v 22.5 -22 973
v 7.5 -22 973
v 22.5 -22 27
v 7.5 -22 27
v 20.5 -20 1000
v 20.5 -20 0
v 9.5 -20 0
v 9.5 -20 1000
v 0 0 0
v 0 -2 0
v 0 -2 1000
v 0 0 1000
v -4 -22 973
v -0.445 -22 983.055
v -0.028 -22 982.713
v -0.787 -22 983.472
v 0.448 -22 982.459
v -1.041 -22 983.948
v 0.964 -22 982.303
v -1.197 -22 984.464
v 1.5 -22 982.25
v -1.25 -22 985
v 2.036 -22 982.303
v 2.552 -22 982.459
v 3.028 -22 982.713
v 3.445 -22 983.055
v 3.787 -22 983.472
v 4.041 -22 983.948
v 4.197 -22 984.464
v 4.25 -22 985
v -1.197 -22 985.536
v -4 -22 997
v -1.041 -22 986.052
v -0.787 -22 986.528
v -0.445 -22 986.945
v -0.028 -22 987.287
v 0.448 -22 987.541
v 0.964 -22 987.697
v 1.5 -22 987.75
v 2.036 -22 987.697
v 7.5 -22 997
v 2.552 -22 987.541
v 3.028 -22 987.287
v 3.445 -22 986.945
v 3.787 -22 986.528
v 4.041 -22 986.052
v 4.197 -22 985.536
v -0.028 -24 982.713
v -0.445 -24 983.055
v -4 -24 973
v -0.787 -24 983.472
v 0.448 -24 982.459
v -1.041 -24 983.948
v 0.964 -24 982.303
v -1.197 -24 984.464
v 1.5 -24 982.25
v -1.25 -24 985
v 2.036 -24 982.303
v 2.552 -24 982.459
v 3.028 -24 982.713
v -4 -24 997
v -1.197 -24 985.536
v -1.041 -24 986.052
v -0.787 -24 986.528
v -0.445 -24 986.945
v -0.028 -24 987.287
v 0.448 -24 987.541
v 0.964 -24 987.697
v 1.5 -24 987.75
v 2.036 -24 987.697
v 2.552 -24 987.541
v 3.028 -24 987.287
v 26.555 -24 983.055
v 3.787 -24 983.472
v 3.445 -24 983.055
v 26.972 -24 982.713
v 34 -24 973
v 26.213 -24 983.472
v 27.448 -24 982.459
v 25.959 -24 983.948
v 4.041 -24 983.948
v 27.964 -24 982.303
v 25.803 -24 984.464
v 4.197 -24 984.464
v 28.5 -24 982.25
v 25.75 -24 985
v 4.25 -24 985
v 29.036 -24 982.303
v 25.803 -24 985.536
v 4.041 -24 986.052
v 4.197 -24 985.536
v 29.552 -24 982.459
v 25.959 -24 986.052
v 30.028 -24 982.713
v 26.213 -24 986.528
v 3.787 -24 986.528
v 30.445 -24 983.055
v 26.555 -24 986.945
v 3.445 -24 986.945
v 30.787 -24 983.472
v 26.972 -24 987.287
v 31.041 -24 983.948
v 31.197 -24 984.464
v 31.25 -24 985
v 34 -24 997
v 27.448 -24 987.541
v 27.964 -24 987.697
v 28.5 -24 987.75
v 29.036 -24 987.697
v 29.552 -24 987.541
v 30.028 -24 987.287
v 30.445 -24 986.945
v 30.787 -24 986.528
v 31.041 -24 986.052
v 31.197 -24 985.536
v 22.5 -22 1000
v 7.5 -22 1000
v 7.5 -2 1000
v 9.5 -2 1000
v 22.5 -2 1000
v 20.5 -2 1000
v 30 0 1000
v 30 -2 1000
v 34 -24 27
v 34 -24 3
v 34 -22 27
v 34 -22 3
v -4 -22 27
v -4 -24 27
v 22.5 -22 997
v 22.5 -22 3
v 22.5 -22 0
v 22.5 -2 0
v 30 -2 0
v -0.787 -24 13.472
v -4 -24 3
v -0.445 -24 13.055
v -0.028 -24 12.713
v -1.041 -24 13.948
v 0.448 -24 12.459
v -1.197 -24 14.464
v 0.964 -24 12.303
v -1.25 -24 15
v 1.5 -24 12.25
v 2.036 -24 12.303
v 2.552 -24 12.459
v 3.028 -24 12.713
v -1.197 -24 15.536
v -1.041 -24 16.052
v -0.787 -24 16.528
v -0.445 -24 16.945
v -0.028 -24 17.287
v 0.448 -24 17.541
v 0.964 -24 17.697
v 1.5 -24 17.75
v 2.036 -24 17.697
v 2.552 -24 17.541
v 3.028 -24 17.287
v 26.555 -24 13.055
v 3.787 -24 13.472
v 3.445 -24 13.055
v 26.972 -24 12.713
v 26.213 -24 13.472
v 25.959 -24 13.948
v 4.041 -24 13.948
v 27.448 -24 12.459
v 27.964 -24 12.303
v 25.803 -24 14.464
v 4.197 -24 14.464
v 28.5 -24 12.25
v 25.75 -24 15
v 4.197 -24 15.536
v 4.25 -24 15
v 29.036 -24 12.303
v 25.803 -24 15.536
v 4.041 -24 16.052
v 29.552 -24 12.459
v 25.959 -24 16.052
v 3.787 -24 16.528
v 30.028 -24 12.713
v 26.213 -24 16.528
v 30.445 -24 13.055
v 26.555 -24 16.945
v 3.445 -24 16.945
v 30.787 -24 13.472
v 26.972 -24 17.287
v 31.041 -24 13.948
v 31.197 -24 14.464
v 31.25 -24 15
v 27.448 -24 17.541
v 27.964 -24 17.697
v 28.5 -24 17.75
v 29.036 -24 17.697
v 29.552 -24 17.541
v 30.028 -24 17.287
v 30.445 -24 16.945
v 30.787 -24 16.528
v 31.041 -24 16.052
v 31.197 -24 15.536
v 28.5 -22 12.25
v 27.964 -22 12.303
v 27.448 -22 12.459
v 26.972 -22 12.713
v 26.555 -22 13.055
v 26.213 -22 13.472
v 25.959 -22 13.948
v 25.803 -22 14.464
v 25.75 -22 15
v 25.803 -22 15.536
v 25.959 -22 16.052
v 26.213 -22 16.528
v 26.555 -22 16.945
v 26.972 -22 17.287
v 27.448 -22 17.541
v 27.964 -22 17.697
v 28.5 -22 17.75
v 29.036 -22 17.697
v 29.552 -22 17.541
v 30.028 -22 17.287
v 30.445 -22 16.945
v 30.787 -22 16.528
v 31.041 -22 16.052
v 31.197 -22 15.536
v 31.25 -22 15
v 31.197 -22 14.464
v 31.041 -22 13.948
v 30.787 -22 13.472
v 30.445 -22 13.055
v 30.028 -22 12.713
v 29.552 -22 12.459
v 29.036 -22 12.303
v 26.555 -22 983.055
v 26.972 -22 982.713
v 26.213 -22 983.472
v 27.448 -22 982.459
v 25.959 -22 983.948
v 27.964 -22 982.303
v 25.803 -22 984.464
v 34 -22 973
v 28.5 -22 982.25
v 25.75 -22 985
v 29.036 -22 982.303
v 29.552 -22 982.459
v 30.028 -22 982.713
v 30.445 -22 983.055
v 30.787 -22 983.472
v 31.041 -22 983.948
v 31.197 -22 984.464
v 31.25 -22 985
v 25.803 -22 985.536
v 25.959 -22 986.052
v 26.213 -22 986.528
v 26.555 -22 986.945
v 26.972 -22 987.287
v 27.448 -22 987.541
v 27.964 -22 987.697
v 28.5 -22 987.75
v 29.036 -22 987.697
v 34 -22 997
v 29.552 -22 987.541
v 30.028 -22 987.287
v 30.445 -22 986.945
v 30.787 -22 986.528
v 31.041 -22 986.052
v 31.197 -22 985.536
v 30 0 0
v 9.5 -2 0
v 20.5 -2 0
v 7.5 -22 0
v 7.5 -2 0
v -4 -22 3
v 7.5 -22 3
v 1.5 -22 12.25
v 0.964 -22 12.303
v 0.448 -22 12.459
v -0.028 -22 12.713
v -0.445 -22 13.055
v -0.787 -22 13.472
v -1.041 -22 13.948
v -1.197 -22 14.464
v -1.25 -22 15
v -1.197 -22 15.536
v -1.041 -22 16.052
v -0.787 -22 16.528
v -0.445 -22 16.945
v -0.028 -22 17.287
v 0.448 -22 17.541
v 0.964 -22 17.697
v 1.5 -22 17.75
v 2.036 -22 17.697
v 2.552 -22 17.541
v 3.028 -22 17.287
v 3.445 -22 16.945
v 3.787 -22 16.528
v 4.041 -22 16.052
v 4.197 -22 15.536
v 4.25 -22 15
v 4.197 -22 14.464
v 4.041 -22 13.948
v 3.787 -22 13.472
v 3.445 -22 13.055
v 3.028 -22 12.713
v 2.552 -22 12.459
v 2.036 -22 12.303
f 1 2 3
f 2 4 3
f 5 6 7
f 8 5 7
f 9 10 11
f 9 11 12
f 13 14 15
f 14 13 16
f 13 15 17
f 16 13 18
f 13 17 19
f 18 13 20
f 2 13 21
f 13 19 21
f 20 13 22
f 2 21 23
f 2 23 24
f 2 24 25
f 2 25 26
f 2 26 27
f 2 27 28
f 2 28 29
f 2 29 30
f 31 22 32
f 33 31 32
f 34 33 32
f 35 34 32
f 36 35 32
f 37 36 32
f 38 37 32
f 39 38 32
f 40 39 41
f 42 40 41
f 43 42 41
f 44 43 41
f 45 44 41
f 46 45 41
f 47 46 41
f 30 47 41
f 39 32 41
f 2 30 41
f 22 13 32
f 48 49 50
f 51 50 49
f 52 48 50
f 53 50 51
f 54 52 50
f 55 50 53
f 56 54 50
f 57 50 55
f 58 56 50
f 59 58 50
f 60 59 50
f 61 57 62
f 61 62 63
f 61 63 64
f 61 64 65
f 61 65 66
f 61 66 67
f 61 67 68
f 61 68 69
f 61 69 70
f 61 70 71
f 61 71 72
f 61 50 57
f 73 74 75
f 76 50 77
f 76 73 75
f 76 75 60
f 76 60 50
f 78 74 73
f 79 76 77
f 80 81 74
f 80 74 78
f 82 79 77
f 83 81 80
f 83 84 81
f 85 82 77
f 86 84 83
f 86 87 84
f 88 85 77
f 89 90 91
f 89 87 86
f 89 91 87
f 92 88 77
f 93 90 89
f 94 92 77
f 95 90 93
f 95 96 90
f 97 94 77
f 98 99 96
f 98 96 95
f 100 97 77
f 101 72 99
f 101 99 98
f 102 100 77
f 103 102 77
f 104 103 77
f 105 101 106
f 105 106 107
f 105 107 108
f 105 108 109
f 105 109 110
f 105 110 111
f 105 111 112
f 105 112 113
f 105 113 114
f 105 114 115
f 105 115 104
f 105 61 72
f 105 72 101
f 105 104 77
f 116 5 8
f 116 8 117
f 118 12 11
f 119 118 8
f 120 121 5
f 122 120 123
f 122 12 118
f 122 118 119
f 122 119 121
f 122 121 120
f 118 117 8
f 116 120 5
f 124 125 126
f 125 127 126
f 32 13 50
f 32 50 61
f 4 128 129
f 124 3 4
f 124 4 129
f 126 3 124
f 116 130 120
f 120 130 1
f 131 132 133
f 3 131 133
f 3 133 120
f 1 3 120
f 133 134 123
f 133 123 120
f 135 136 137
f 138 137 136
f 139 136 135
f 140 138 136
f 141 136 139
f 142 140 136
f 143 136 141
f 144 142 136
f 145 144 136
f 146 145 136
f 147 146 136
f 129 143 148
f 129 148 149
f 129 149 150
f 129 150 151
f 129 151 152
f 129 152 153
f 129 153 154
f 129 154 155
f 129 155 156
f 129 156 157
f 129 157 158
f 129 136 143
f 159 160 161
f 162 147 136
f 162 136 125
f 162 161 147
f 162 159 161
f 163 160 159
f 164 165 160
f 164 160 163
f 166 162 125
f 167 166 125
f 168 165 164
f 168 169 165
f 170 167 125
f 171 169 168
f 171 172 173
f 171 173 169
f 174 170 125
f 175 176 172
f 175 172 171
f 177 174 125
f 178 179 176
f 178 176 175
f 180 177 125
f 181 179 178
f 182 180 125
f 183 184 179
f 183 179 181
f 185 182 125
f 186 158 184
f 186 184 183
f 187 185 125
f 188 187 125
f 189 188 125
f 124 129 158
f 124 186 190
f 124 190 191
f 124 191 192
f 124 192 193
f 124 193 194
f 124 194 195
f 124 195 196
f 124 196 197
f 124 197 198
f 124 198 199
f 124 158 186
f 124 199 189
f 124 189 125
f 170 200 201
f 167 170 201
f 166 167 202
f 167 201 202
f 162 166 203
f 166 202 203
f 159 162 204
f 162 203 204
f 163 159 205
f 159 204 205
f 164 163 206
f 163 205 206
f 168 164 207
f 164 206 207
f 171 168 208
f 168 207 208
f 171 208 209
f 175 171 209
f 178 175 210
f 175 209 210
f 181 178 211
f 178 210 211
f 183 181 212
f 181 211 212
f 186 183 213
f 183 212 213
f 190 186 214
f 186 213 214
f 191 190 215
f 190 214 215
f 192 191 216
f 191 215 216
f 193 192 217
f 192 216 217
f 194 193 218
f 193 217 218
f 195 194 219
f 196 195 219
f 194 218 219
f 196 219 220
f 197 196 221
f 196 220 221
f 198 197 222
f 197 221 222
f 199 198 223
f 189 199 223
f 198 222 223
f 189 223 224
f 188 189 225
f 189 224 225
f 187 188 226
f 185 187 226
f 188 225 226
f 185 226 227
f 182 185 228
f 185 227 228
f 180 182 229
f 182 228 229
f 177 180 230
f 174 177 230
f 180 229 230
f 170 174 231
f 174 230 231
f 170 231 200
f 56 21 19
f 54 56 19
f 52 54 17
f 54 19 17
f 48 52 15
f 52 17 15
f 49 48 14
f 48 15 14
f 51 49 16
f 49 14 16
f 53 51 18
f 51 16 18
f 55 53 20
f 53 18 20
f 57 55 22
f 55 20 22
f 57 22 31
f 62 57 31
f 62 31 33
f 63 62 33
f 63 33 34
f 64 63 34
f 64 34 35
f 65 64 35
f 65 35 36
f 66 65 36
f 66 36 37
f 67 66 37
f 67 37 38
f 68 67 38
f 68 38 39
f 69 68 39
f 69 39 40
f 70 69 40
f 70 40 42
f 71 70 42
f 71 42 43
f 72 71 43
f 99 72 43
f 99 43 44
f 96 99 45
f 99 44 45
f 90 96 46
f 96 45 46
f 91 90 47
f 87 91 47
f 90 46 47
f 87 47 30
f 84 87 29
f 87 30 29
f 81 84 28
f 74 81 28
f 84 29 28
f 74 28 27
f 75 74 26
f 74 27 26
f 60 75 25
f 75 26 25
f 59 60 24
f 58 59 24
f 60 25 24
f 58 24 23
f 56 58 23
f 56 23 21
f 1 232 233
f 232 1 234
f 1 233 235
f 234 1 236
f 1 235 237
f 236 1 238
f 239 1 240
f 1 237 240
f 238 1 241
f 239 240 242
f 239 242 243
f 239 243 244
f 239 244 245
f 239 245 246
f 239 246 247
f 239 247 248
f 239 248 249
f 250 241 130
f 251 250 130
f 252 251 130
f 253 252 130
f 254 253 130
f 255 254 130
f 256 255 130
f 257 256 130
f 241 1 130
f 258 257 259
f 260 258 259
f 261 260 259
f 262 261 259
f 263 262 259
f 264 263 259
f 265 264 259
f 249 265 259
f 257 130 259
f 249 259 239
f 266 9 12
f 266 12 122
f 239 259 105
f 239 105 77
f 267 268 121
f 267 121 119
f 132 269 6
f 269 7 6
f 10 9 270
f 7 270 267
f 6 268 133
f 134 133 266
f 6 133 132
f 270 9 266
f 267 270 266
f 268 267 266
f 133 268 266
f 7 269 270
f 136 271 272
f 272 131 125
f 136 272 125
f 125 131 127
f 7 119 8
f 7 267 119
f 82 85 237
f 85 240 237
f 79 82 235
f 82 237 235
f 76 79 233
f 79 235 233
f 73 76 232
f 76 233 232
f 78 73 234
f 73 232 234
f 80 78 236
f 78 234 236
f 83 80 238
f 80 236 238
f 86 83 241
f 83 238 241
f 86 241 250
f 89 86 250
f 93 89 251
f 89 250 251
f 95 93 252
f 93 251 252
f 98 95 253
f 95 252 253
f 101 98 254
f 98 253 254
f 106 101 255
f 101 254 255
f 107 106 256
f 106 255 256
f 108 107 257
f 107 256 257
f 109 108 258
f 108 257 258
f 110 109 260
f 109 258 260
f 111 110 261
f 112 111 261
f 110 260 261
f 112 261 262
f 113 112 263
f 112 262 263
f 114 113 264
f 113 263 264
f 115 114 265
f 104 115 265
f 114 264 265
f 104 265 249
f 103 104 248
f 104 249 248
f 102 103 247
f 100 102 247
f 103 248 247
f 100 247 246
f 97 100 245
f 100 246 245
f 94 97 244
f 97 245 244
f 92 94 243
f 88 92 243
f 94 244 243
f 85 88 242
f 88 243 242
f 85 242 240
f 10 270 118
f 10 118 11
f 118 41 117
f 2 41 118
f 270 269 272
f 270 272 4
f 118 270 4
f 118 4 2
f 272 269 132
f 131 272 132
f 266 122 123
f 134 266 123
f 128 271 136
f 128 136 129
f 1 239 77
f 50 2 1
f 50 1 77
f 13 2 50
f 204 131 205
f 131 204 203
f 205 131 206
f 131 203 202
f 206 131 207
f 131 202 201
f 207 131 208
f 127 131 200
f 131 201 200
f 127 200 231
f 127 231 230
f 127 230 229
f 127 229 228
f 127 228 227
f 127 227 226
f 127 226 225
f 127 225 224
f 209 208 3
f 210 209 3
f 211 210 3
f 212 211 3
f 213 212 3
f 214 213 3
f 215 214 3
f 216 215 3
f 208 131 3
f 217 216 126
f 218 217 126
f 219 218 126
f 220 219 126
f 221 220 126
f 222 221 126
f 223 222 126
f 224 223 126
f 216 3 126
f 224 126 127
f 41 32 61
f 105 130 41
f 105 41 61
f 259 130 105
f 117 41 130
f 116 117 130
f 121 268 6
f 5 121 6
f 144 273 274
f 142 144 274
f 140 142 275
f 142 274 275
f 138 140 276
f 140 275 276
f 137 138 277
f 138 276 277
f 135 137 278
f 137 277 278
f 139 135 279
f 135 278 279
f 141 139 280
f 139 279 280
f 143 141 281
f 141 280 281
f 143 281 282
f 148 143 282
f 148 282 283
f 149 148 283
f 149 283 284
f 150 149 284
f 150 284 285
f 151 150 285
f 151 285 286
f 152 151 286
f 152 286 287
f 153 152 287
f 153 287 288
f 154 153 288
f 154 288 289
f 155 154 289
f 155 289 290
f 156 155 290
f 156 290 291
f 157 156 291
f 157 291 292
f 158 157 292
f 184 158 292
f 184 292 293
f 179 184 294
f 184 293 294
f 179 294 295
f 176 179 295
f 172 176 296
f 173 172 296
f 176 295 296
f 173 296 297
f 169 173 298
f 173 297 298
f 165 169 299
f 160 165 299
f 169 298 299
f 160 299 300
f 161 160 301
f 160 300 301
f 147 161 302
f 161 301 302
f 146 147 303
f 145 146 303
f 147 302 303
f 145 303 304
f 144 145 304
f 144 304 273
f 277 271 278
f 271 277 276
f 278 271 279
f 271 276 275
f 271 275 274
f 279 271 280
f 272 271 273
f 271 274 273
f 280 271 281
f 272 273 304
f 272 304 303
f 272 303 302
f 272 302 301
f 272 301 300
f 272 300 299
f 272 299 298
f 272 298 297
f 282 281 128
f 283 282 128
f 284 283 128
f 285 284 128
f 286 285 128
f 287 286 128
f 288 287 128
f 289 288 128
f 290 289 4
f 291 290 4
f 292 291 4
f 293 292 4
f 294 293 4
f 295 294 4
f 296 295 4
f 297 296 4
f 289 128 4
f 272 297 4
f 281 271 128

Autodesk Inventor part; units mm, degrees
ref_plane "YZ Plane" through (0, 0, 0) normal (1, 0, 0) x (0, 1, 0)
ref_plane "XZ Plane" through (0, 0, 0) normal (0, 1, 0) x (-1, 0, 0)
ref_plane "XY Plane" through (0, 0, 0) normal (0, 0, 1) x (1, 0, 0)
sketch "Skizze1" plane through (0, 0, 0) normal (0, 0, 1) x (1, 0, 0)
  line L0 (0, 0) -> (30, 0)
  line L1 (30, 0) -> (30, -2)
  line L2 (30, -2) -> (0, -2)
  line L3 (0, -2) -> (0, 0)
  line L4 (7.5, -2) -> (9.5, -2)
  line L5 (9.5, -2) -> (9.5, -22)
  line L6 (9.5, -22) -> (7.5, -22)
  line L7 (7.5, -22) -> (7.5, -2)
  line L8 (9.5, -22) -> (20.5, -22)
  line L9 (20.5, -22) -> (20.5, -20)
  line L10 (20.5, -20) -> (9.5, -20)
  line L11 (9.5, -20) -> (9.5, -22)
  line L12 (20.5, -22) -> (22.5, -22)
  line L13 (22.5, -22) -> (22.5, -2)
  line L14 (22.5, -2) -> (20.5, -2)
  line L15 (20.5, -2) -> (20.5, -22)
  line L16 (15, -20) -> (15, -2) construction
  point P0 (20.5, -2)
  point P1 (9.5, -2)
  dimension "d0" = 30
  dimension "d1" = 2
  dimension "d2" = 2
  dimension "d3" = 20
  dimension "d4" = 11
  dimension "d5" = 2
  dimension "d6" = 2
  dimension "d7" = 7.5
  dimension "d8" = 20.5
  dimension "d9" = 20
  dimension "d12" = 7.5
extrude "Extrusion1" add sketch "Skizze1" along normal blind 1000 contours L0 L1 L2 L3 | L2 L5 L6 L7 | L13 L12 L9 L15 L2 | L10 L9 L8 L5
sketch "Skizze2" plane through (22.5, -22, 0) normal (0, -1, 0) x (1, 0, 0)
  line L0 (7.5, 0) -> (7.5, 1000) projected
  line L1 (-26.5, 3) -> (11.5, 3)
  line L2 (11.5, 3) -> (11.5, 27)
  line L3 (-22.5, 0) -> (-22.5, 1000) projected
  line L4 (-26.5, 3) -> (-26.5, 27)
  line L5 (-26.5, 27) -> (11.5, 27)
  line L6 (-15, 0) -> (0, 0) projected
  line L7 (-26.5, 997) -> (11.5, 997)
  line L8 (11.5, 997) -> (11.5, 973)
  line L9 (11.5, 973) -> (-26.5, 973)
  line L10 (-26.5, 973) -> (-26.5, 997)
  line L11 (-15, 1000) -> (0, 1000) projected
  line L12 (0, 0) -> (0, 1000) projected
  line L13 (-15, 0) -> (-15, 1000) projected
  line L14 (-13, 0) -> (-13, 1000) projected
  point P0 (7.5, 3)
  point P1 (7.5, 27)
  dimension "d13" = 24
  dimension "d21" = 4
  dimension "d22" = 4
  dimension "d24" = 24
  dimension "d25" = 4
  dimension "d26" = 4
  dimension "d46" = 3
  dimension "d47" = 3
extrude "Extrusion2" add sketch "Skizze2" along normal blind 2 contours L1 L12 L5 L0 | L0 L5 L2 L1 | L1 L14 L5 L12 | L9 L12 L7 L0 | L0 L7 L8 L9 | L1 L13 L5 L14 | L9 L14 L7 L12 | L1 L3 L5 L13 | L9 L13 L7 L14 | L1 L4 L5 L3 | L9 L3 L7 L13 | L9 L10 L7 L3
sketch "Skizze3" plane through (22.5, -24, 0) normal (0, -1, 0) x (1, 0, 0)
  line L0 (-21, 15) -> (6, 15)
  line L1 (-15, 997) -> (-15, 1000) projected
  line L2 (-15, 0) -> (-15, 1000) projected
  line L3 (0, 0) -> (0, 1000) projected
  line L4 (0, 0) -> (0, 3) projected
  line L5 (6, 985) -> (-21, 985)
  line L6 (0, 27) -> (0, 973) projected
  line L7 (0, 3) -> (0, 27) projected
  line L8 (-15, 0) -> (-15, 3) projected
  line L9 (-15, 27) -> (-15, 973) projected
  line L10 (0, 997) -> (0, 1000) projected
  line L11 (0, 973) -> (0, 997) projected
  line L12 (-15, 3) -> (-15, 27) projected
  line L13 (-15, 973) -> (-15, 997) projected
  dimension "d19" = 6
  dimension "d23" = 15
  dimension "d27" = 6
  dimension "d28" = 6
  dimension "d48" = 15
hole "Bohrung1" at (1.5, -24, 15) at (28.5, -24, 15) at (1.5, -24, 985) at (28.5, -24, 985) direction (0, 1, 0) diameter 5.5 depth 2 clearance for "Flachkopfmaschinenschraube" size "M5" standard "ANSI Metrisches M Profil"
properties part number "TrägerUI" material "Aluminium 6061, Katze"
